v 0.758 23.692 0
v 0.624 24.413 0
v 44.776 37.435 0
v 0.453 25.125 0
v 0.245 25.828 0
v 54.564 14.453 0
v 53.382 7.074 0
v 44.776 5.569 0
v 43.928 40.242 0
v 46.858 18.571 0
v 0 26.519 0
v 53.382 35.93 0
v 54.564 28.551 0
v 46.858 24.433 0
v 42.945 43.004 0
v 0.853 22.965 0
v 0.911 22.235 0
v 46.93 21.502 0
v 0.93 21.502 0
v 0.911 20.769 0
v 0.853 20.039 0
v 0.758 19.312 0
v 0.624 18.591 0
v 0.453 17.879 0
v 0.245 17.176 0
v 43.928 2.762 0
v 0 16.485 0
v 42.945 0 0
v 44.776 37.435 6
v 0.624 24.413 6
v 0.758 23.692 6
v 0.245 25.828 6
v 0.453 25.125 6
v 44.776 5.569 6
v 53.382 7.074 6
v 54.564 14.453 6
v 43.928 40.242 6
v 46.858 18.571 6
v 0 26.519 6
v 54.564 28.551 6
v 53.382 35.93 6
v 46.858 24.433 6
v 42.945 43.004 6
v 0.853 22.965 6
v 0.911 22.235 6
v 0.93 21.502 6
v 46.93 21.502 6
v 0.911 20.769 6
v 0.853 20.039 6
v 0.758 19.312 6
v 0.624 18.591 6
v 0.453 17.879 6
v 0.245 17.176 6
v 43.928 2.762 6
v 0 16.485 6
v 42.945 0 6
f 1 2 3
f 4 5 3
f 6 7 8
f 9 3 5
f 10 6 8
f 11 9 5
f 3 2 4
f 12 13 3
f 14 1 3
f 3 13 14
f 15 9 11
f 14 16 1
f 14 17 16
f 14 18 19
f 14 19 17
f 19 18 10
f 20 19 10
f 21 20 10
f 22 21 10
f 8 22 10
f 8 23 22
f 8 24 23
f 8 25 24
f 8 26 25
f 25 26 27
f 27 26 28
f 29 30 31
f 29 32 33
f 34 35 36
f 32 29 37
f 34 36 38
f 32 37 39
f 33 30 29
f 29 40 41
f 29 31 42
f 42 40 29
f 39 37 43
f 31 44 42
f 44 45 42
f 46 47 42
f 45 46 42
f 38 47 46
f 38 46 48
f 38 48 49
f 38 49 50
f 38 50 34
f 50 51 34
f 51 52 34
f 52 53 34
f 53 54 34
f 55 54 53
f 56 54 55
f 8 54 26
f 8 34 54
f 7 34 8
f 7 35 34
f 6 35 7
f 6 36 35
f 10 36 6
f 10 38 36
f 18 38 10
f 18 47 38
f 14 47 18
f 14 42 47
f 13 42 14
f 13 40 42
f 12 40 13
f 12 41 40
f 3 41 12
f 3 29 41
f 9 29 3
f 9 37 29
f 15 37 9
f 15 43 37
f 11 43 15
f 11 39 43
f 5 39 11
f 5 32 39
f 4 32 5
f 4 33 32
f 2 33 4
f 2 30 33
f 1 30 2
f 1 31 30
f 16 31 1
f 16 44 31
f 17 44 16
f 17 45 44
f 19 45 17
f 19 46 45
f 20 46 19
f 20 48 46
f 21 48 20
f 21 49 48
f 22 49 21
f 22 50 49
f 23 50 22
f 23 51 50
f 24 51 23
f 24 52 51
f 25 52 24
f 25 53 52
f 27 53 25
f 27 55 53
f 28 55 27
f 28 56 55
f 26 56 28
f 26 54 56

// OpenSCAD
$fn = 32;

// ----------------------------------------------------------------------
// Gear sector: 2 teeth on 42 degrees
// ----------------------------------------------------------------------

// --- parameters (mm) ---
sector_angle = 42;        // sector angle, degrees
root_r = 60;              // root circle radius
tooth_h = 8;              // tooth height over the root circle
teeth = 2;                // number of teeth on the sector
hub_r = 14;               // hub bore radius
plate_t = 6;              // sector thickness, Z
arc_step = 3;             // sampling step of the root/hub arcs, degrees

tip_r = root_r + tooth_h;  // tip circle radius

profile = [[42.945, 0], [43.928, 2.762], [44.776, 5.569], [53.382, 7.074], [54.564, 14.453], [46.858, 18.571], [46.93, 21.502], [46.858, 24.433], [54.564, 28.551], [53.382, 35.93], [44.776, 37.435], [43.928, 40.242], [42.945, 43.004], [0, 26.519], [0.245, 25.828], [0.453, 25.125], [0.624, 24.413], [0.758, 23.692], [0.853, 22.965], [0.911, 22.235], [0.93, 21.502], [0.911, 20.769], [0.853, 20.039], [0.758, 19.312], [0.624, 18.591], [0.453, 17.879], [0.245, 17.176], [0, 16.485]];  // primary outline, 28 points, counter clockwise

// --- the one profile operation ---
linear_extrude(height = plate_t) polygon(points = profile);
